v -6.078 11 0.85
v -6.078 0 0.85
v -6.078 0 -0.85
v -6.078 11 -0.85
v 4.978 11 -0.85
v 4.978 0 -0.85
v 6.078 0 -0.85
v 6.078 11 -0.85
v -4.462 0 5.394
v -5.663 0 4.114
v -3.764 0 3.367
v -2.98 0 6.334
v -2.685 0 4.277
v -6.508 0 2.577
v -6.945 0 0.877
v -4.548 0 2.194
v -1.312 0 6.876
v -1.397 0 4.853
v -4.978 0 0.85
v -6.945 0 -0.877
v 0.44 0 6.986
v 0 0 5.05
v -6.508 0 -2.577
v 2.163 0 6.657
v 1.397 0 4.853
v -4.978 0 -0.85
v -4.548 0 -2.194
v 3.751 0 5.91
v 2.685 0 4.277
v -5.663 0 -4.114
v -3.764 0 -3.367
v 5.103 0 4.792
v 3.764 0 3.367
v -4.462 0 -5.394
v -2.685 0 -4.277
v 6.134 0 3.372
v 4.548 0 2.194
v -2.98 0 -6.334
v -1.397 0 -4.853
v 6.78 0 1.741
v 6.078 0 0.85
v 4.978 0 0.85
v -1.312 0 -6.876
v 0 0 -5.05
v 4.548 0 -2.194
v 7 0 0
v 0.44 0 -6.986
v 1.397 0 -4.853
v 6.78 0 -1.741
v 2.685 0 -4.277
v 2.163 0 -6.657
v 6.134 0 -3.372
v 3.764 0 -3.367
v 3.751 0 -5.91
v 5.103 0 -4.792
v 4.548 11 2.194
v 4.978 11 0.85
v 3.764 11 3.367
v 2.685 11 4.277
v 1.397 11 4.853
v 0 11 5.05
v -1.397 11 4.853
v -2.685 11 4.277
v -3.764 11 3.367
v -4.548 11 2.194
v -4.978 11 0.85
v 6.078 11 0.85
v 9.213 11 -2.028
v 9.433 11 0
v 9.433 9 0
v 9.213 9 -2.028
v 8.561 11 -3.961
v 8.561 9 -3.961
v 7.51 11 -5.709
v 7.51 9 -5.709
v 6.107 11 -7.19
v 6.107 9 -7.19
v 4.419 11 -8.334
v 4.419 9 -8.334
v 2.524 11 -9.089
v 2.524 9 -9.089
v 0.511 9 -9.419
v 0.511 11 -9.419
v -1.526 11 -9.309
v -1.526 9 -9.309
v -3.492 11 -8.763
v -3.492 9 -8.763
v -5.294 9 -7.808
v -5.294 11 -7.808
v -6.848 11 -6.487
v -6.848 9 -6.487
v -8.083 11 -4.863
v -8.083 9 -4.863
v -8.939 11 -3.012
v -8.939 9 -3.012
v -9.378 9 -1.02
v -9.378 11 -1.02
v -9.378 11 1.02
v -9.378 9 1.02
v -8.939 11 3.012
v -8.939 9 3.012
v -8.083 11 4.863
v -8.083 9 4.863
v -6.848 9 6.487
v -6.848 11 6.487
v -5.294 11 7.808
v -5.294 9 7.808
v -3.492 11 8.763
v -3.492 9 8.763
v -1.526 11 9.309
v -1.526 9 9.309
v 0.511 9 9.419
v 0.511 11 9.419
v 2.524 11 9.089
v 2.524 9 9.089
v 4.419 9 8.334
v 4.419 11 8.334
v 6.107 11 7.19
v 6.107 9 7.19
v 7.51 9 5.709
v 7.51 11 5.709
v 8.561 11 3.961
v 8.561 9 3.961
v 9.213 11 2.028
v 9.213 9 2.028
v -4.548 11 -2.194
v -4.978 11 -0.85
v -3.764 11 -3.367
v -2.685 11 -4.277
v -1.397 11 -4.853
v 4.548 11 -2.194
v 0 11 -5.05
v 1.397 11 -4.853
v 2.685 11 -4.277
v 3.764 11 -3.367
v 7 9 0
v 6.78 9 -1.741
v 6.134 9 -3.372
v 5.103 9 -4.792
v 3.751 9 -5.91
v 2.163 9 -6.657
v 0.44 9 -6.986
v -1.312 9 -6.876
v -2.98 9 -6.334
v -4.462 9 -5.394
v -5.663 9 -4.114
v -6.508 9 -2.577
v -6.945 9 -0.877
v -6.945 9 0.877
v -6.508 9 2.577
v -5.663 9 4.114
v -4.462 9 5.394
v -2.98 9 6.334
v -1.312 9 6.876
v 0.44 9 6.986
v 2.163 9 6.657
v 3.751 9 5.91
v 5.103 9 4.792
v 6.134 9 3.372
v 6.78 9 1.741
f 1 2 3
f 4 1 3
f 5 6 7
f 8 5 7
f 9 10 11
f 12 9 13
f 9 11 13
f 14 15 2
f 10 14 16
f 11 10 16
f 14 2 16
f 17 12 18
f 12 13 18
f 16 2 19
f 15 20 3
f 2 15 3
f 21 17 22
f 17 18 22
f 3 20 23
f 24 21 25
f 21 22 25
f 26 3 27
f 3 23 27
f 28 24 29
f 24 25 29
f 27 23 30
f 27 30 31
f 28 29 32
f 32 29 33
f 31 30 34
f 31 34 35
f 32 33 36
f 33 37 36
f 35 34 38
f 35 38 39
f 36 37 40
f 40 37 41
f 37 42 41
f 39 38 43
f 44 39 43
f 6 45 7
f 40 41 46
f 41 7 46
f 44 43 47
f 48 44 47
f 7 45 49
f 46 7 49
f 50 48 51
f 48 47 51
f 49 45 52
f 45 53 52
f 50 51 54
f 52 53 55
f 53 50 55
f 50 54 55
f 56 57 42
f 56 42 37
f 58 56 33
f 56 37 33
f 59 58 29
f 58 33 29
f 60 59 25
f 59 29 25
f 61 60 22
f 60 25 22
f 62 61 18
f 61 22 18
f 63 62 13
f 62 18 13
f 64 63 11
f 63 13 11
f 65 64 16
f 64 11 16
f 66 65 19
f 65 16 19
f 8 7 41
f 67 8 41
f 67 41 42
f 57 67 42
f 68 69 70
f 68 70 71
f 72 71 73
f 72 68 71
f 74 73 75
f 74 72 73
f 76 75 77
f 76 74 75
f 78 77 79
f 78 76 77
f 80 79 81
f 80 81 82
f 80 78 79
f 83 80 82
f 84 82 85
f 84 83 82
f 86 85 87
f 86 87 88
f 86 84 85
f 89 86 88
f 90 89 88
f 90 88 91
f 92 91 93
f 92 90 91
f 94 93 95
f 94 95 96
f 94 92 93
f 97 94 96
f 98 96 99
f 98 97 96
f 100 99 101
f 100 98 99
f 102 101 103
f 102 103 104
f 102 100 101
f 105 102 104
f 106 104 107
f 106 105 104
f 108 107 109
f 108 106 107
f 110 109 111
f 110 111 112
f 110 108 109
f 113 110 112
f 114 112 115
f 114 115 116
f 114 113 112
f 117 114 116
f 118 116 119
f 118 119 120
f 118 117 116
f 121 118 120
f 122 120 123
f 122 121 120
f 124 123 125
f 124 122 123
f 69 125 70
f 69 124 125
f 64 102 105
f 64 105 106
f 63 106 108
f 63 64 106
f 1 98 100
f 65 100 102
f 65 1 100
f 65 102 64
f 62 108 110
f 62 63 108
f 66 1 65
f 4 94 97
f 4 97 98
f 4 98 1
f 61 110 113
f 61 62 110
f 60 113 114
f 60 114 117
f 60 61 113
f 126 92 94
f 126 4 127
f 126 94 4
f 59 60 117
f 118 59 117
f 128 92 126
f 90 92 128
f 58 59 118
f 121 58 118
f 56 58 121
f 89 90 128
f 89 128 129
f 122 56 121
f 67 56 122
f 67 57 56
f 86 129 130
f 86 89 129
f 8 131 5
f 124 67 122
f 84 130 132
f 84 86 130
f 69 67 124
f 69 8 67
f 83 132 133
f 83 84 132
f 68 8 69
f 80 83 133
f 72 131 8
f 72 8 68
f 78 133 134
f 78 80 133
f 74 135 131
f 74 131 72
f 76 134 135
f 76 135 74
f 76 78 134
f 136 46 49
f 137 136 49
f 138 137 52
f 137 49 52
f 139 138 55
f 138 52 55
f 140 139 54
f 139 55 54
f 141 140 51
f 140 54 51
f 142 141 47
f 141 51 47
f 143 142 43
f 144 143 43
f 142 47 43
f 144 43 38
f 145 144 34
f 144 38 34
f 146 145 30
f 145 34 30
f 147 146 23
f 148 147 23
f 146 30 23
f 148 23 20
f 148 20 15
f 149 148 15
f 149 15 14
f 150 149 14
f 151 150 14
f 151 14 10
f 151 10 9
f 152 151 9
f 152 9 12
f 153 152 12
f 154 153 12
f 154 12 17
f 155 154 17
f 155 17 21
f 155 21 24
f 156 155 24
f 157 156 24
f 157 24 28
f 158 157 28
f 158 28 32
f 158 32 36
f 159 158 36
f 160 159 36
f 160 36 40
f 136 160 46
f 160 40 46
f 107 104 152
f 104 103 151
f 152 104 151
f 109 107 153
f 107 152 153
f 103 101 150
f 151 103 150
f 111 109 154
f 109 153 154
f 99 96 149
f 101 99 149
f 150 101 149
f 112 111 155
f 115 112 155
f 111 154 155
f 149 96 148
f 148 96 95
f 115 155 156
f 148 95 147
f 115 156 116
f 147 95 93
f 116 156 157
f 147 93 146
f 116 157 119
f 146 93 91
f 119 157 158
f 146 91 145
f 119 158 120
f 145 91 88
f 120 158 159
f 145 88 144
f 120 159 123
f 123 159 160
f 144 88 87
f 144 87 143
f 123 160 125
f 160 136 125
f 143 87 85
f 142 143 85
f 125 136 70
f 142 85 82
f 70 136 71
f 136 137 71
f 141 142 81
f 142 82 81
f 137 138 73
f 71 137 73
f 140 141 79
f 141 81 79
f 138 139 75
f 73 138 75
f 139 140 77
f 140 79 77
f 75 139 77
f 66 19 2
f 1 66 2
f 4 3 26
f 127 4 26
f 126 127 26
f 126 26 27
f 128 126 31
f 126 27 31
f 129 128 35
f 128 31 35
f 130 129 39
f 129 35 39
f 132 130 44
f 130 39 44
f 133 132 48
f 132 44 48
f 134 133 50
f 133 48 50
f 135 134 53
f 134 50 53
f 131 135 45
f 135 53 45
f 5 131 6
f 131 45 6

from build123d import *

# Parameters (mm, degrees)
SKETCH1_R           = 7
BOSS_EXTRUDE1_DEPTH = 11
SKETCH2_R           = 9.433087352
SKETCH2_R_2         = 7
BOSS_EXTRUDE2_DEPTH = 2


with BuildPart() as part:
    # Sketch1 → Boss-Extrude1 (new body)
    with BuildSketch(Plane(origin=(0, 0, 0), x_dir=(1, 0, 0), z_dir=(0, 1, 0))):
        Circle(SKETCH1_R)
        with BuildLine():
            Line((-6.077951386, 0.85), (-4.977951386, 0.85))
            ThreePointArc((-4.977951386, 0.85), (0, 5.05), (4.977951386, 0.85))
            Line((4.977951386, 0.85), (6.077951386, 0.85))
            Line((6.077951386, 0.85), (6.077951386, -0.85))
            Line((6.077951386, -0.85), (4.977951386, -0.85))
            ThreePointArc((4.977951386, -0.85), (0, -5.05), (-4.977951386, -0.85))
            Line((-4.977951386, -0.85), (-6.077951386, -0.85))
            Line((-6.077951386, -0.85), (-6.077951386, 0.85))
        make_face(mode=Mode.SUBTRACT)
    extrude(amount=BOSS_EXTRUDE1_DEPTH)

    # Sketch2 → Boss-Extrude2 (add)
    with BuildSketch(Plane(origin=(0, 11, 0), x_dir=(1, 0, 0), z_dir=(0, 1, 0))):
        Circle(SKETCH2_R)
        Circle(SKETCH2_R_2, mode=Mode.SUBTRACT)
    extrude(amount=-BOSS_EXTRUDE2_DEPTH)


solid = part.part
